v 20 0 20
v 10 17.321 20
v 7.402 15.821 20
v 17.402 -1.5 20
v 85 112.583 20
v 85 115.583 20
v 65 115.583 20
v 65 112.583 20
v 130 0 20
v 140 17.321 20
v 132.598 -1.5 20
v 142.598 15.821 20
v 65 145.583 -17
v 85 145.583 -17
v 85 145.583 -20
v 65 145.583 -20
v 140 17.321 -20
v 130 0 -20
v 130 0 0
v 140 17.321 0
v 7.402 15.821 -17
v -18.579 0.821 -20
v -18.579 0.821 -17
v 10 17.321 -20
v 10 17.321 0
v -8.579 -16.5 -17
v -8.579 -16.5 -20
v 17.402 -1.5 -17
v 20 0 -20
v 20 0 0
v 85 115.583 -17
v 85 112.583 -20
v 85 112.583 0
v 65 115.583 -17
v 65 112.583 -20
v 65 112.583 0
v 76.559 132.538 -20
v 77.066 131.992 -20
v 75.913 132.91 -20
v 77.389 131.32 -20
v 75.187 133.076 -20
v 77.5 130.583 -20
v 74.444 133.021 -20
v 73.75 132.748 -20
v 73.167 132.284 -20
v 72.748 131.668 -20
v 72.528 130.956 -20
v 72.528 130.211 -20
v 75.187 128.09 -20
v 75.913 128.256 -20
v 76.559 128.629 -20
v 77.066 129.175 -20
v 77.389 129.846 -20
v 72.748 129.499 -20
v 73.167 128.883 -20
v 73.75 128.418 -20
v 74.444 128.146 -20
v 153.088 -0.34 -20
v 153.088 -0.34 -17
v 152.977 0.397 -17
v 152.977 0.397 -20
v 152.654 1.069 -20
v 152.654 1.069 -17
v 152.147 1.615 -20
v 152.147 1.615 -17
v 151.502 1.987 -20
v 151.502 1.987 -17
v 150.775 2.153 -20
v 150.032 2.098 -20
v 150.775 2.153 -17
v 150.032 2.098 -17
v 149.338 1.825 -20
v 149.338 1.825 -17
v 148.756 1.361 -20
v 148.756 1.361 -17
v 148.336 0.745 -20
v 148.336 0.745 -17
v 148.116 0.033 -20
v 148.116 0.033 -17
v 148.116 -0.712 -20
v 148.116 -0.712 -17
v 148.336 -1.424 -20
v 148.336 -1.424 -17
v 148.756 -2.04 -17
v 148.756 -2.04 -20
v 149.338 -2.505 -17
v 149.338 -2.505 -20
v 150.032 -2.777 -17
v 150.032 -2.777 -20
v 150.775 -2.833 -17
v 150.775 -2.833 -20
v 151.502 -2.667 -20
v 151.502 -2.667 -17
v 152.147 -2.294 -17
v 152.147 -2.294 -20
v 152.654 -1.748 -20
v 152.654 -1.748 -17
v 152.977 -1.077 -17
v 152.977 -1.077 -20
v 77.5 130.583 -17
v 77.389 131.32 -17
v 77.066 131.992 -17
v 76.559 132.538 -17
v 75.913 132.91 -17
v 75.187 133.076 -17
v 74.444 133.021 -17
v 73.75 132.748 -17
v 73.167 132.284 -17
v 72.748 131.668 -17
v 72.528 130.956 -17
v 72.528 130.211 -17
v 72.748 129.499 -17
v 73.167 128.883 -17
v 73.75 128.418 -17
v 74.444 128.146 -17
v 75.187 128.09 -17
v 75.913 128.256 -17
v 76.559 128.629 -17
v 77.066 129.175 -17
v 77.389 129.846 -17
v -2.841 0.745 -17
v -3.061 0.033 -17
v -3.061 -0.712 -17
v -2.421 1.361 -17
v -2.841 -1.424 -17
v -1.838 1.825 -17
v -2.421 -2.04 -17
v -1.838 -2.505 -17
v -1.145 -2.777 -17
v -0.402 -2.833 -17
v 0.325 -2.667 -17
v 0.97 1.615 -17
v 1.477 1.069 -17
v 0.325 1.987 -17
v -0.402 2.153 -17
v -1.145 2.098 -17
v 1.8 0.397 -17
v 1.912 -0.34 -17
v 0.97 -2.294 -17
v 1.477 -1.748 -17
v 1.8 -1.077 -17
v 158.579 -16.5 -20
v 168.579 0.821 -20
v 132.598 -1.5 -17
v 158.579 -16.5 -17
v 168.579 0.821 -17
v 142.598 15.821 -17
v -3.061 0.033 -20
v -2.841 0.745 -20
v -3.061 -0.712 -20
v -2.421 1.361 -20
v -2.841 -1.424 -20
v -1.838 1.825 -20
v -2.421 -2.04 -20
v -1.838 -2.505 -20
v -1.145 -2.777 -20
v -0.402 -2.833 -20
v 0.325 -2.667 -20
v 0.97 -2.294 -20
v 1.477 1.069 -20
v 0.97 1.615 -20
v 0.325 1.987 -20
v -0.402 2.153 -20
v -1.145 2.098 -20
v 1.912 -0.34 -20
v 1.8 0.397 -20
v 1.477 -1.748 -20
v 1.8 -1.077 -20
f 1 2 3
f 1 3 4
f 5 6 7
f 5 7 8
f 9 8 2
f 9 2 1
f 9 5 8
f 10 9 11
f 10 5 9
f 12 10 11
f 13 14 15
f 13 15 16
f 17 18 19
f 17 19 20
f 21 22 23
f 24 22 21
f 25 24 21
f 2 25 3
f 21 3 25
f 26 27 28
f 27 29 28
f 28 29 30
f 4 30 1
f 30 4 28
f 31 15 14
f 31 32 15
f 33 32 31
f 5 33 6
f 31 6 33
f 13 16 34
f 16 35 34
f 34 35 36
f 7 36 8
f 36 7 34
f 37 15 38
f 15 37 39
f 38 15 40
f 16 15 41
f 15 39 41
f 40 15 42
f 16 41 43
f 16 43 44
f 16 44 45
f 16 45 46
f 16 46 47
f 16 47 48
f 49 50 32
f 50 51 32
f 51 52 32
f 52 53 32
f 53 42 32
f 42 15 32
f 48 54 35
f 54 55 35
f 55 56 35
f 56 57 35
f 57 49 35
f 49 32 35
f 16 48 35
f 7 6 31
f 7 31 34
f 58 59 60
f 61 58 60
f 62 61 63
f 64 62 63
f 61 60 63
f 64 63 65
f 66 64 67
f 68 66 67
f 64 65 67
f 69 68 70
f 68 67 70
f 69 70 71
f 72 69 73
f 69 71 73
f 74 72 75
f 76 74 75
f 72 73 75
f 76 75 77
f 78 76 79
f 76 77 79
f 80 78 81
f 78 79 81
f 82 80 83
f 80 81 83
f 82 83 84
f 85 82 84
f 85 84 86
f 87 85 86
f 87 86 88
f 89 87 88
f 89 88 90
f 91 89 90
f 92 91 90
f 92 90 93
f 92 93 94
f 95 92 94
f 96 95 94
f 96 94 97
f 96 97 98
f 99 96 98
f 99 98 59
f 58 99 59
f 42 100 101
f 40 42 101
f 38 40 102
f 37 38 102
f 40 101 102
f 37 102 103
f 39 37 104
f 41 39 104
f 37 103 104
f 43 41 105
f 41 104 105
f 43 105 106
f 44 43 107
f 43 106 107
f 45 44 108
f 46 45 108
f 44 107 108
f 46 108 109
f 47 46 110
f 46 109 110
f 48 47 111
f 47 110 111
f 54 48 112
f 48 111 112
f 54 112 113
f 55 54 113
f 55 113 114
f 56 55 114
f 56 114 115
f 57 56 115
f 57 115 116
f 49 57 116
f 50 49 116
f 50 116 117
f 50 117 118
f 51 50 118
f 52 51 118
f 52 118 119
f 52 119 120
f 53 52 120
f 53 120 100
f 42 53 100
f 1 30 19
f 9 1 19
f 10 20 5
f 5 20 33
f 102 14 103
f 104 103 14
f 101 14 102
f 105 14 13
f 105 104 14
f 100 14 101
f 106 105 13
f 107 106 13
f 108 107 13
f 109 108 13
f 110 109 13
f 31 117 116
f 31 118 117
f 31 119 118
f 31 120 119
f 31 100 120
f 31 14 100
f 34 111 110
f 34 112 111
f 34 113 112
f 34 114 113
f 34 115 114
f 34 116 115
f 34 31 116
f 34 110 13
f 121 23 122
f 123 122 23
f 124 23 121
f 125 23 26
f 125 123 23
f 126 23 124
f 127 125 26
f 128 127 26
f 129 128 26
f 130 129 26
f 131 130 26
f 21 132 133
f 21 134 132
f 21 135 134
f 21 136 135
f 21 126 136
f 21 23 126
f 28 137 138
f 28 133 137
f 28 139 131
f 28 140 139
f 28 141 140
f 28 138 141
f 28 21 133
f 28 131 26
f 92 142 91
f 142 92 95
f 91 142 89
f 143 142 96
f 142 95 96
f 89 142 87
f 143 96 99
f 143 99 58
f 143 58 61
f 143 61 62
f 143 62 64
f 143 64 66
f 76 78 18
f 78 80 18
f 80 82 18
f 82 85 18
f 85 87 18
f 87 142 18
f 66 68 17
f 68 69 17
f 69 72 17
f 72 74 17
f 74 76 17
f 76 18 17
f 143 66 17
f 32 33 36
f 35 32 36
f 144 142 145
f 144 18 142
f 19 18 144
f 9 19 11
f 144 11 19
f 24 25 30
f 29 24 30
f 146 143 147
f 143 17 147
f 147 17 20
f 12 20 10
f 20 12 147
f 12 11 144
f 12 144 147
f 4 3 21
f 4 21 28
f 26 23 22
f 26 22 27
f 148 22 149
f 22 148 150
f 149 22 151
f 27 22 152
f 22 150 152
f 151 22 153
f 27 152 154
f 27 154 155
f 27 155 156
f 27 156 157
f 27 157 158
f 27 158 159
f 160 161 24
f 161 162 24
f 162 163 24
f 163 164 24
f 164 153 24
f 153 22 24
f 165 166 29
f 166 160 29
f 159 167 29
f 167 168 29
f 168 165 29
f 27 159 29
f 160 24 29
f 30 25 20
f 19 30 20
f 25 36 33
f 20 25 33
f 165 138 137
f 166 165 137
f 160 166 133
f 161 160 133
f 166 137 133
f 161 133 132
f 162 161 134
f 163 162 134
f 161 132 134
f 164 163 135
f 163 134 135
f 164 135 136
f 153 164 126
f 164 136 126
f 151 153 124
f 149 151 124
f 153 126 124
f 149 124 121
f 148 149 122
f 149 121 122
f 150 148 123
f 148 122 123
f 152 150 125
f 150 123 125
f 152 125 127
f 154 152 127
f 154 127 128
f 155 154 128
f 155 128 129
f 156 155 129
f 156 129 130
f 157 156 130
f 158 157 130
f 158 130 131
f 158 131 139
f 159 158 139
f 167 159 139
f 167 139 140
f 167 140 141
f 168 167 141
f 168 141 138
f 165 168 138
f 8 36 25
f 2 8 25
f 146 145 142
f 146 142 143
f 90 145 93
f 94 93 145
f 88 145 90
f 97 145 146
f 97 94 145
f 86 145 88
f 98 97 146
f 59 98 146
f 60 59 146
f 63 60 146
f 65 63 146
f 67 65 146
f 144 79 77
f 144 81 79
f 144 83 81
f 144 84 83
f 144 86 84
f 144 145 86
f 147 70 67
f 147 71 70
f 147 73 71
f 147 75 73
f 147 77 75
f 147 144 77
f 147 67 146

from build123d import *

# Parameters (mm, degrees)
F1_DEPTH  = 20
F3_DEPTH  = 20.001
F4_W      = 20
F4_H      = 20
F5_DEPTH  = 3
F6_W      = 20
F6_H      = 3
F7_DEPTH  = 30
F8_R      = 2.5
F9_DEPTH  = 3.001
F10_W     = 20
F10_H     = 20
F11_DEPTH = 3
F12_W     = 20
F12_H     = 3
F13_DEPTH = 30
F14_R     = 2.5
F15_DEPTH = 3.001
F16_W     = 20
F16_H     = 20
F17_DEPTH = 3
F18_W     = 20
F18_H     = 3
F19_DEPTH = 30
F20_R     = 2.5
F21_DEPTH = 3.001


with BuildPart() as f1:
    # F0 (on Top) → F1 (new body)
    with BuildSketch(Plane.XY):
        Polygon((0, 0), (150, 0), (75, 129.9038105677), align=None)
    extrude(amount=F1_DEPTH)

    # F2 (on face) → F3 (cut, through all)
    with BuildSketch(Plane.XY.offset(20)):
        Polygon((75, 129.9038105677), (65, 112.583302492), (85, 112.583302492), align=None)
        Polygon((20, 0), (10, 17.3205080757), (0, 0), align=None)
        Polygon((140, 17.3205080757), (130, 0), (150, 0), align=None)
    extrude(amount=-F3_DEPTH, mode=Mode.SUBTRACT)

    # F4 (on face) → F5 (join)
    with BuildSketch(Plane(origin=(97.5, -56.291651246, 0), x_dir=(0.5, 0.8660254038, 0), z_dir=(0.8660254038, -0.5, 0))):
        with Locations((75, -10)):
            Rectangle(F4_W, F4_H)
        with Locations((75, 10)):
            Rectangle(F4_W, F4_H)
    extrude(amount=F5_DEPTH)

    # F6 (on face) → F7 (join)
    with BuildSketch(Plane(origin=(100.0980762114, -57.791651246, 0), x_dir=(0.5, 0.8660254038, 0), z_dir=(0.8660254038, -0.5, 0))):
        with Locations((75, -18.5)):
            Rectangle(F6_W, F6_H)
    extrude(amount=F7_DEPTH)

    # F8 (on face) → F9 (cut, through all)
    with BuildSketch(Plane.XY.offset(-17)):
        with Locations((150.5884572681, -0.3397459622)):
            Circle(F8_R)
    extrude(amount=-F9_DEPTH, mode=Mode.SUBTRACT)

    # F10 (on face) → F11 (join)
    with BuildSketch(Plane(origin=(0, 112.583302492, 0), x_dir=(-1, 0, 0), z_dir=(0, 1, 0))):
        with Locations((-75, 10)):
            Rectangle(F10_W, F10_H)
        with Locations((-75, -10)):
            Rectangle(F10_W, F10_H)
    extrude(amount=F11_DEPTH)

    # F12 (on face) → F13 (join)
    with BuildSketch(Plane(origin=(0, 115.583302492, 0), x_dir=(-1, 0, 0), z_dir=(0, 1, 0))):
        with Locations((-75, -18.5)):
            Rectangle(F12_W, F12_H)
    extrude(amount=F13_DEPTH)

    # F14 (on face) → F15 (cut, through all)
    with BuildSketch(Plane.XY.offset(-17)):
        with Locations((75, 130.583302492)):
            Circle(F14_R)
    extrude(amount=-F15_DEPTH, mode=Mode.SUBTRACT)

    # F16 (on face) → F17 (join)
    with BuildSketch(Plane(origin=(15, 8.6602540378, 0), x_dir=(0.5, -0.8660254038, 0), z_dir=(-0.8660254038, -0.5, 0))):
        with Locations((0, -10)):
            Rectangle(F16_W, F16_H)
        with Locations((0, 10)):
            Rectangle(F16_W, F16_H)
    extrude(amount=F17_DEPTH)

    # F18 (on face) → F19 (join)
    with BuildSketch(Plane(origin=(12.4019237886, 7.1602540378, 0), x_dir=(0.5, -0.8660254038, 0), z_dir=(-0.8660254038, -0.5, 0))):
        with Locations((0, -18.5)):
            Rectangle(F18_W, F18_H)
    extrude(amount=F19_DEPTH)

    # F20 (on face) → F21 (cut, through all)
    with BuildSketch(Plane.XY.offset(-17)):
        with Locations((-0.5884572681, -0.3397459622)):
            Circle(F20_R)
    extrude(amount=-F21_DEPTH, mode=Mode.SUBTRACT)


solid = f1.part
